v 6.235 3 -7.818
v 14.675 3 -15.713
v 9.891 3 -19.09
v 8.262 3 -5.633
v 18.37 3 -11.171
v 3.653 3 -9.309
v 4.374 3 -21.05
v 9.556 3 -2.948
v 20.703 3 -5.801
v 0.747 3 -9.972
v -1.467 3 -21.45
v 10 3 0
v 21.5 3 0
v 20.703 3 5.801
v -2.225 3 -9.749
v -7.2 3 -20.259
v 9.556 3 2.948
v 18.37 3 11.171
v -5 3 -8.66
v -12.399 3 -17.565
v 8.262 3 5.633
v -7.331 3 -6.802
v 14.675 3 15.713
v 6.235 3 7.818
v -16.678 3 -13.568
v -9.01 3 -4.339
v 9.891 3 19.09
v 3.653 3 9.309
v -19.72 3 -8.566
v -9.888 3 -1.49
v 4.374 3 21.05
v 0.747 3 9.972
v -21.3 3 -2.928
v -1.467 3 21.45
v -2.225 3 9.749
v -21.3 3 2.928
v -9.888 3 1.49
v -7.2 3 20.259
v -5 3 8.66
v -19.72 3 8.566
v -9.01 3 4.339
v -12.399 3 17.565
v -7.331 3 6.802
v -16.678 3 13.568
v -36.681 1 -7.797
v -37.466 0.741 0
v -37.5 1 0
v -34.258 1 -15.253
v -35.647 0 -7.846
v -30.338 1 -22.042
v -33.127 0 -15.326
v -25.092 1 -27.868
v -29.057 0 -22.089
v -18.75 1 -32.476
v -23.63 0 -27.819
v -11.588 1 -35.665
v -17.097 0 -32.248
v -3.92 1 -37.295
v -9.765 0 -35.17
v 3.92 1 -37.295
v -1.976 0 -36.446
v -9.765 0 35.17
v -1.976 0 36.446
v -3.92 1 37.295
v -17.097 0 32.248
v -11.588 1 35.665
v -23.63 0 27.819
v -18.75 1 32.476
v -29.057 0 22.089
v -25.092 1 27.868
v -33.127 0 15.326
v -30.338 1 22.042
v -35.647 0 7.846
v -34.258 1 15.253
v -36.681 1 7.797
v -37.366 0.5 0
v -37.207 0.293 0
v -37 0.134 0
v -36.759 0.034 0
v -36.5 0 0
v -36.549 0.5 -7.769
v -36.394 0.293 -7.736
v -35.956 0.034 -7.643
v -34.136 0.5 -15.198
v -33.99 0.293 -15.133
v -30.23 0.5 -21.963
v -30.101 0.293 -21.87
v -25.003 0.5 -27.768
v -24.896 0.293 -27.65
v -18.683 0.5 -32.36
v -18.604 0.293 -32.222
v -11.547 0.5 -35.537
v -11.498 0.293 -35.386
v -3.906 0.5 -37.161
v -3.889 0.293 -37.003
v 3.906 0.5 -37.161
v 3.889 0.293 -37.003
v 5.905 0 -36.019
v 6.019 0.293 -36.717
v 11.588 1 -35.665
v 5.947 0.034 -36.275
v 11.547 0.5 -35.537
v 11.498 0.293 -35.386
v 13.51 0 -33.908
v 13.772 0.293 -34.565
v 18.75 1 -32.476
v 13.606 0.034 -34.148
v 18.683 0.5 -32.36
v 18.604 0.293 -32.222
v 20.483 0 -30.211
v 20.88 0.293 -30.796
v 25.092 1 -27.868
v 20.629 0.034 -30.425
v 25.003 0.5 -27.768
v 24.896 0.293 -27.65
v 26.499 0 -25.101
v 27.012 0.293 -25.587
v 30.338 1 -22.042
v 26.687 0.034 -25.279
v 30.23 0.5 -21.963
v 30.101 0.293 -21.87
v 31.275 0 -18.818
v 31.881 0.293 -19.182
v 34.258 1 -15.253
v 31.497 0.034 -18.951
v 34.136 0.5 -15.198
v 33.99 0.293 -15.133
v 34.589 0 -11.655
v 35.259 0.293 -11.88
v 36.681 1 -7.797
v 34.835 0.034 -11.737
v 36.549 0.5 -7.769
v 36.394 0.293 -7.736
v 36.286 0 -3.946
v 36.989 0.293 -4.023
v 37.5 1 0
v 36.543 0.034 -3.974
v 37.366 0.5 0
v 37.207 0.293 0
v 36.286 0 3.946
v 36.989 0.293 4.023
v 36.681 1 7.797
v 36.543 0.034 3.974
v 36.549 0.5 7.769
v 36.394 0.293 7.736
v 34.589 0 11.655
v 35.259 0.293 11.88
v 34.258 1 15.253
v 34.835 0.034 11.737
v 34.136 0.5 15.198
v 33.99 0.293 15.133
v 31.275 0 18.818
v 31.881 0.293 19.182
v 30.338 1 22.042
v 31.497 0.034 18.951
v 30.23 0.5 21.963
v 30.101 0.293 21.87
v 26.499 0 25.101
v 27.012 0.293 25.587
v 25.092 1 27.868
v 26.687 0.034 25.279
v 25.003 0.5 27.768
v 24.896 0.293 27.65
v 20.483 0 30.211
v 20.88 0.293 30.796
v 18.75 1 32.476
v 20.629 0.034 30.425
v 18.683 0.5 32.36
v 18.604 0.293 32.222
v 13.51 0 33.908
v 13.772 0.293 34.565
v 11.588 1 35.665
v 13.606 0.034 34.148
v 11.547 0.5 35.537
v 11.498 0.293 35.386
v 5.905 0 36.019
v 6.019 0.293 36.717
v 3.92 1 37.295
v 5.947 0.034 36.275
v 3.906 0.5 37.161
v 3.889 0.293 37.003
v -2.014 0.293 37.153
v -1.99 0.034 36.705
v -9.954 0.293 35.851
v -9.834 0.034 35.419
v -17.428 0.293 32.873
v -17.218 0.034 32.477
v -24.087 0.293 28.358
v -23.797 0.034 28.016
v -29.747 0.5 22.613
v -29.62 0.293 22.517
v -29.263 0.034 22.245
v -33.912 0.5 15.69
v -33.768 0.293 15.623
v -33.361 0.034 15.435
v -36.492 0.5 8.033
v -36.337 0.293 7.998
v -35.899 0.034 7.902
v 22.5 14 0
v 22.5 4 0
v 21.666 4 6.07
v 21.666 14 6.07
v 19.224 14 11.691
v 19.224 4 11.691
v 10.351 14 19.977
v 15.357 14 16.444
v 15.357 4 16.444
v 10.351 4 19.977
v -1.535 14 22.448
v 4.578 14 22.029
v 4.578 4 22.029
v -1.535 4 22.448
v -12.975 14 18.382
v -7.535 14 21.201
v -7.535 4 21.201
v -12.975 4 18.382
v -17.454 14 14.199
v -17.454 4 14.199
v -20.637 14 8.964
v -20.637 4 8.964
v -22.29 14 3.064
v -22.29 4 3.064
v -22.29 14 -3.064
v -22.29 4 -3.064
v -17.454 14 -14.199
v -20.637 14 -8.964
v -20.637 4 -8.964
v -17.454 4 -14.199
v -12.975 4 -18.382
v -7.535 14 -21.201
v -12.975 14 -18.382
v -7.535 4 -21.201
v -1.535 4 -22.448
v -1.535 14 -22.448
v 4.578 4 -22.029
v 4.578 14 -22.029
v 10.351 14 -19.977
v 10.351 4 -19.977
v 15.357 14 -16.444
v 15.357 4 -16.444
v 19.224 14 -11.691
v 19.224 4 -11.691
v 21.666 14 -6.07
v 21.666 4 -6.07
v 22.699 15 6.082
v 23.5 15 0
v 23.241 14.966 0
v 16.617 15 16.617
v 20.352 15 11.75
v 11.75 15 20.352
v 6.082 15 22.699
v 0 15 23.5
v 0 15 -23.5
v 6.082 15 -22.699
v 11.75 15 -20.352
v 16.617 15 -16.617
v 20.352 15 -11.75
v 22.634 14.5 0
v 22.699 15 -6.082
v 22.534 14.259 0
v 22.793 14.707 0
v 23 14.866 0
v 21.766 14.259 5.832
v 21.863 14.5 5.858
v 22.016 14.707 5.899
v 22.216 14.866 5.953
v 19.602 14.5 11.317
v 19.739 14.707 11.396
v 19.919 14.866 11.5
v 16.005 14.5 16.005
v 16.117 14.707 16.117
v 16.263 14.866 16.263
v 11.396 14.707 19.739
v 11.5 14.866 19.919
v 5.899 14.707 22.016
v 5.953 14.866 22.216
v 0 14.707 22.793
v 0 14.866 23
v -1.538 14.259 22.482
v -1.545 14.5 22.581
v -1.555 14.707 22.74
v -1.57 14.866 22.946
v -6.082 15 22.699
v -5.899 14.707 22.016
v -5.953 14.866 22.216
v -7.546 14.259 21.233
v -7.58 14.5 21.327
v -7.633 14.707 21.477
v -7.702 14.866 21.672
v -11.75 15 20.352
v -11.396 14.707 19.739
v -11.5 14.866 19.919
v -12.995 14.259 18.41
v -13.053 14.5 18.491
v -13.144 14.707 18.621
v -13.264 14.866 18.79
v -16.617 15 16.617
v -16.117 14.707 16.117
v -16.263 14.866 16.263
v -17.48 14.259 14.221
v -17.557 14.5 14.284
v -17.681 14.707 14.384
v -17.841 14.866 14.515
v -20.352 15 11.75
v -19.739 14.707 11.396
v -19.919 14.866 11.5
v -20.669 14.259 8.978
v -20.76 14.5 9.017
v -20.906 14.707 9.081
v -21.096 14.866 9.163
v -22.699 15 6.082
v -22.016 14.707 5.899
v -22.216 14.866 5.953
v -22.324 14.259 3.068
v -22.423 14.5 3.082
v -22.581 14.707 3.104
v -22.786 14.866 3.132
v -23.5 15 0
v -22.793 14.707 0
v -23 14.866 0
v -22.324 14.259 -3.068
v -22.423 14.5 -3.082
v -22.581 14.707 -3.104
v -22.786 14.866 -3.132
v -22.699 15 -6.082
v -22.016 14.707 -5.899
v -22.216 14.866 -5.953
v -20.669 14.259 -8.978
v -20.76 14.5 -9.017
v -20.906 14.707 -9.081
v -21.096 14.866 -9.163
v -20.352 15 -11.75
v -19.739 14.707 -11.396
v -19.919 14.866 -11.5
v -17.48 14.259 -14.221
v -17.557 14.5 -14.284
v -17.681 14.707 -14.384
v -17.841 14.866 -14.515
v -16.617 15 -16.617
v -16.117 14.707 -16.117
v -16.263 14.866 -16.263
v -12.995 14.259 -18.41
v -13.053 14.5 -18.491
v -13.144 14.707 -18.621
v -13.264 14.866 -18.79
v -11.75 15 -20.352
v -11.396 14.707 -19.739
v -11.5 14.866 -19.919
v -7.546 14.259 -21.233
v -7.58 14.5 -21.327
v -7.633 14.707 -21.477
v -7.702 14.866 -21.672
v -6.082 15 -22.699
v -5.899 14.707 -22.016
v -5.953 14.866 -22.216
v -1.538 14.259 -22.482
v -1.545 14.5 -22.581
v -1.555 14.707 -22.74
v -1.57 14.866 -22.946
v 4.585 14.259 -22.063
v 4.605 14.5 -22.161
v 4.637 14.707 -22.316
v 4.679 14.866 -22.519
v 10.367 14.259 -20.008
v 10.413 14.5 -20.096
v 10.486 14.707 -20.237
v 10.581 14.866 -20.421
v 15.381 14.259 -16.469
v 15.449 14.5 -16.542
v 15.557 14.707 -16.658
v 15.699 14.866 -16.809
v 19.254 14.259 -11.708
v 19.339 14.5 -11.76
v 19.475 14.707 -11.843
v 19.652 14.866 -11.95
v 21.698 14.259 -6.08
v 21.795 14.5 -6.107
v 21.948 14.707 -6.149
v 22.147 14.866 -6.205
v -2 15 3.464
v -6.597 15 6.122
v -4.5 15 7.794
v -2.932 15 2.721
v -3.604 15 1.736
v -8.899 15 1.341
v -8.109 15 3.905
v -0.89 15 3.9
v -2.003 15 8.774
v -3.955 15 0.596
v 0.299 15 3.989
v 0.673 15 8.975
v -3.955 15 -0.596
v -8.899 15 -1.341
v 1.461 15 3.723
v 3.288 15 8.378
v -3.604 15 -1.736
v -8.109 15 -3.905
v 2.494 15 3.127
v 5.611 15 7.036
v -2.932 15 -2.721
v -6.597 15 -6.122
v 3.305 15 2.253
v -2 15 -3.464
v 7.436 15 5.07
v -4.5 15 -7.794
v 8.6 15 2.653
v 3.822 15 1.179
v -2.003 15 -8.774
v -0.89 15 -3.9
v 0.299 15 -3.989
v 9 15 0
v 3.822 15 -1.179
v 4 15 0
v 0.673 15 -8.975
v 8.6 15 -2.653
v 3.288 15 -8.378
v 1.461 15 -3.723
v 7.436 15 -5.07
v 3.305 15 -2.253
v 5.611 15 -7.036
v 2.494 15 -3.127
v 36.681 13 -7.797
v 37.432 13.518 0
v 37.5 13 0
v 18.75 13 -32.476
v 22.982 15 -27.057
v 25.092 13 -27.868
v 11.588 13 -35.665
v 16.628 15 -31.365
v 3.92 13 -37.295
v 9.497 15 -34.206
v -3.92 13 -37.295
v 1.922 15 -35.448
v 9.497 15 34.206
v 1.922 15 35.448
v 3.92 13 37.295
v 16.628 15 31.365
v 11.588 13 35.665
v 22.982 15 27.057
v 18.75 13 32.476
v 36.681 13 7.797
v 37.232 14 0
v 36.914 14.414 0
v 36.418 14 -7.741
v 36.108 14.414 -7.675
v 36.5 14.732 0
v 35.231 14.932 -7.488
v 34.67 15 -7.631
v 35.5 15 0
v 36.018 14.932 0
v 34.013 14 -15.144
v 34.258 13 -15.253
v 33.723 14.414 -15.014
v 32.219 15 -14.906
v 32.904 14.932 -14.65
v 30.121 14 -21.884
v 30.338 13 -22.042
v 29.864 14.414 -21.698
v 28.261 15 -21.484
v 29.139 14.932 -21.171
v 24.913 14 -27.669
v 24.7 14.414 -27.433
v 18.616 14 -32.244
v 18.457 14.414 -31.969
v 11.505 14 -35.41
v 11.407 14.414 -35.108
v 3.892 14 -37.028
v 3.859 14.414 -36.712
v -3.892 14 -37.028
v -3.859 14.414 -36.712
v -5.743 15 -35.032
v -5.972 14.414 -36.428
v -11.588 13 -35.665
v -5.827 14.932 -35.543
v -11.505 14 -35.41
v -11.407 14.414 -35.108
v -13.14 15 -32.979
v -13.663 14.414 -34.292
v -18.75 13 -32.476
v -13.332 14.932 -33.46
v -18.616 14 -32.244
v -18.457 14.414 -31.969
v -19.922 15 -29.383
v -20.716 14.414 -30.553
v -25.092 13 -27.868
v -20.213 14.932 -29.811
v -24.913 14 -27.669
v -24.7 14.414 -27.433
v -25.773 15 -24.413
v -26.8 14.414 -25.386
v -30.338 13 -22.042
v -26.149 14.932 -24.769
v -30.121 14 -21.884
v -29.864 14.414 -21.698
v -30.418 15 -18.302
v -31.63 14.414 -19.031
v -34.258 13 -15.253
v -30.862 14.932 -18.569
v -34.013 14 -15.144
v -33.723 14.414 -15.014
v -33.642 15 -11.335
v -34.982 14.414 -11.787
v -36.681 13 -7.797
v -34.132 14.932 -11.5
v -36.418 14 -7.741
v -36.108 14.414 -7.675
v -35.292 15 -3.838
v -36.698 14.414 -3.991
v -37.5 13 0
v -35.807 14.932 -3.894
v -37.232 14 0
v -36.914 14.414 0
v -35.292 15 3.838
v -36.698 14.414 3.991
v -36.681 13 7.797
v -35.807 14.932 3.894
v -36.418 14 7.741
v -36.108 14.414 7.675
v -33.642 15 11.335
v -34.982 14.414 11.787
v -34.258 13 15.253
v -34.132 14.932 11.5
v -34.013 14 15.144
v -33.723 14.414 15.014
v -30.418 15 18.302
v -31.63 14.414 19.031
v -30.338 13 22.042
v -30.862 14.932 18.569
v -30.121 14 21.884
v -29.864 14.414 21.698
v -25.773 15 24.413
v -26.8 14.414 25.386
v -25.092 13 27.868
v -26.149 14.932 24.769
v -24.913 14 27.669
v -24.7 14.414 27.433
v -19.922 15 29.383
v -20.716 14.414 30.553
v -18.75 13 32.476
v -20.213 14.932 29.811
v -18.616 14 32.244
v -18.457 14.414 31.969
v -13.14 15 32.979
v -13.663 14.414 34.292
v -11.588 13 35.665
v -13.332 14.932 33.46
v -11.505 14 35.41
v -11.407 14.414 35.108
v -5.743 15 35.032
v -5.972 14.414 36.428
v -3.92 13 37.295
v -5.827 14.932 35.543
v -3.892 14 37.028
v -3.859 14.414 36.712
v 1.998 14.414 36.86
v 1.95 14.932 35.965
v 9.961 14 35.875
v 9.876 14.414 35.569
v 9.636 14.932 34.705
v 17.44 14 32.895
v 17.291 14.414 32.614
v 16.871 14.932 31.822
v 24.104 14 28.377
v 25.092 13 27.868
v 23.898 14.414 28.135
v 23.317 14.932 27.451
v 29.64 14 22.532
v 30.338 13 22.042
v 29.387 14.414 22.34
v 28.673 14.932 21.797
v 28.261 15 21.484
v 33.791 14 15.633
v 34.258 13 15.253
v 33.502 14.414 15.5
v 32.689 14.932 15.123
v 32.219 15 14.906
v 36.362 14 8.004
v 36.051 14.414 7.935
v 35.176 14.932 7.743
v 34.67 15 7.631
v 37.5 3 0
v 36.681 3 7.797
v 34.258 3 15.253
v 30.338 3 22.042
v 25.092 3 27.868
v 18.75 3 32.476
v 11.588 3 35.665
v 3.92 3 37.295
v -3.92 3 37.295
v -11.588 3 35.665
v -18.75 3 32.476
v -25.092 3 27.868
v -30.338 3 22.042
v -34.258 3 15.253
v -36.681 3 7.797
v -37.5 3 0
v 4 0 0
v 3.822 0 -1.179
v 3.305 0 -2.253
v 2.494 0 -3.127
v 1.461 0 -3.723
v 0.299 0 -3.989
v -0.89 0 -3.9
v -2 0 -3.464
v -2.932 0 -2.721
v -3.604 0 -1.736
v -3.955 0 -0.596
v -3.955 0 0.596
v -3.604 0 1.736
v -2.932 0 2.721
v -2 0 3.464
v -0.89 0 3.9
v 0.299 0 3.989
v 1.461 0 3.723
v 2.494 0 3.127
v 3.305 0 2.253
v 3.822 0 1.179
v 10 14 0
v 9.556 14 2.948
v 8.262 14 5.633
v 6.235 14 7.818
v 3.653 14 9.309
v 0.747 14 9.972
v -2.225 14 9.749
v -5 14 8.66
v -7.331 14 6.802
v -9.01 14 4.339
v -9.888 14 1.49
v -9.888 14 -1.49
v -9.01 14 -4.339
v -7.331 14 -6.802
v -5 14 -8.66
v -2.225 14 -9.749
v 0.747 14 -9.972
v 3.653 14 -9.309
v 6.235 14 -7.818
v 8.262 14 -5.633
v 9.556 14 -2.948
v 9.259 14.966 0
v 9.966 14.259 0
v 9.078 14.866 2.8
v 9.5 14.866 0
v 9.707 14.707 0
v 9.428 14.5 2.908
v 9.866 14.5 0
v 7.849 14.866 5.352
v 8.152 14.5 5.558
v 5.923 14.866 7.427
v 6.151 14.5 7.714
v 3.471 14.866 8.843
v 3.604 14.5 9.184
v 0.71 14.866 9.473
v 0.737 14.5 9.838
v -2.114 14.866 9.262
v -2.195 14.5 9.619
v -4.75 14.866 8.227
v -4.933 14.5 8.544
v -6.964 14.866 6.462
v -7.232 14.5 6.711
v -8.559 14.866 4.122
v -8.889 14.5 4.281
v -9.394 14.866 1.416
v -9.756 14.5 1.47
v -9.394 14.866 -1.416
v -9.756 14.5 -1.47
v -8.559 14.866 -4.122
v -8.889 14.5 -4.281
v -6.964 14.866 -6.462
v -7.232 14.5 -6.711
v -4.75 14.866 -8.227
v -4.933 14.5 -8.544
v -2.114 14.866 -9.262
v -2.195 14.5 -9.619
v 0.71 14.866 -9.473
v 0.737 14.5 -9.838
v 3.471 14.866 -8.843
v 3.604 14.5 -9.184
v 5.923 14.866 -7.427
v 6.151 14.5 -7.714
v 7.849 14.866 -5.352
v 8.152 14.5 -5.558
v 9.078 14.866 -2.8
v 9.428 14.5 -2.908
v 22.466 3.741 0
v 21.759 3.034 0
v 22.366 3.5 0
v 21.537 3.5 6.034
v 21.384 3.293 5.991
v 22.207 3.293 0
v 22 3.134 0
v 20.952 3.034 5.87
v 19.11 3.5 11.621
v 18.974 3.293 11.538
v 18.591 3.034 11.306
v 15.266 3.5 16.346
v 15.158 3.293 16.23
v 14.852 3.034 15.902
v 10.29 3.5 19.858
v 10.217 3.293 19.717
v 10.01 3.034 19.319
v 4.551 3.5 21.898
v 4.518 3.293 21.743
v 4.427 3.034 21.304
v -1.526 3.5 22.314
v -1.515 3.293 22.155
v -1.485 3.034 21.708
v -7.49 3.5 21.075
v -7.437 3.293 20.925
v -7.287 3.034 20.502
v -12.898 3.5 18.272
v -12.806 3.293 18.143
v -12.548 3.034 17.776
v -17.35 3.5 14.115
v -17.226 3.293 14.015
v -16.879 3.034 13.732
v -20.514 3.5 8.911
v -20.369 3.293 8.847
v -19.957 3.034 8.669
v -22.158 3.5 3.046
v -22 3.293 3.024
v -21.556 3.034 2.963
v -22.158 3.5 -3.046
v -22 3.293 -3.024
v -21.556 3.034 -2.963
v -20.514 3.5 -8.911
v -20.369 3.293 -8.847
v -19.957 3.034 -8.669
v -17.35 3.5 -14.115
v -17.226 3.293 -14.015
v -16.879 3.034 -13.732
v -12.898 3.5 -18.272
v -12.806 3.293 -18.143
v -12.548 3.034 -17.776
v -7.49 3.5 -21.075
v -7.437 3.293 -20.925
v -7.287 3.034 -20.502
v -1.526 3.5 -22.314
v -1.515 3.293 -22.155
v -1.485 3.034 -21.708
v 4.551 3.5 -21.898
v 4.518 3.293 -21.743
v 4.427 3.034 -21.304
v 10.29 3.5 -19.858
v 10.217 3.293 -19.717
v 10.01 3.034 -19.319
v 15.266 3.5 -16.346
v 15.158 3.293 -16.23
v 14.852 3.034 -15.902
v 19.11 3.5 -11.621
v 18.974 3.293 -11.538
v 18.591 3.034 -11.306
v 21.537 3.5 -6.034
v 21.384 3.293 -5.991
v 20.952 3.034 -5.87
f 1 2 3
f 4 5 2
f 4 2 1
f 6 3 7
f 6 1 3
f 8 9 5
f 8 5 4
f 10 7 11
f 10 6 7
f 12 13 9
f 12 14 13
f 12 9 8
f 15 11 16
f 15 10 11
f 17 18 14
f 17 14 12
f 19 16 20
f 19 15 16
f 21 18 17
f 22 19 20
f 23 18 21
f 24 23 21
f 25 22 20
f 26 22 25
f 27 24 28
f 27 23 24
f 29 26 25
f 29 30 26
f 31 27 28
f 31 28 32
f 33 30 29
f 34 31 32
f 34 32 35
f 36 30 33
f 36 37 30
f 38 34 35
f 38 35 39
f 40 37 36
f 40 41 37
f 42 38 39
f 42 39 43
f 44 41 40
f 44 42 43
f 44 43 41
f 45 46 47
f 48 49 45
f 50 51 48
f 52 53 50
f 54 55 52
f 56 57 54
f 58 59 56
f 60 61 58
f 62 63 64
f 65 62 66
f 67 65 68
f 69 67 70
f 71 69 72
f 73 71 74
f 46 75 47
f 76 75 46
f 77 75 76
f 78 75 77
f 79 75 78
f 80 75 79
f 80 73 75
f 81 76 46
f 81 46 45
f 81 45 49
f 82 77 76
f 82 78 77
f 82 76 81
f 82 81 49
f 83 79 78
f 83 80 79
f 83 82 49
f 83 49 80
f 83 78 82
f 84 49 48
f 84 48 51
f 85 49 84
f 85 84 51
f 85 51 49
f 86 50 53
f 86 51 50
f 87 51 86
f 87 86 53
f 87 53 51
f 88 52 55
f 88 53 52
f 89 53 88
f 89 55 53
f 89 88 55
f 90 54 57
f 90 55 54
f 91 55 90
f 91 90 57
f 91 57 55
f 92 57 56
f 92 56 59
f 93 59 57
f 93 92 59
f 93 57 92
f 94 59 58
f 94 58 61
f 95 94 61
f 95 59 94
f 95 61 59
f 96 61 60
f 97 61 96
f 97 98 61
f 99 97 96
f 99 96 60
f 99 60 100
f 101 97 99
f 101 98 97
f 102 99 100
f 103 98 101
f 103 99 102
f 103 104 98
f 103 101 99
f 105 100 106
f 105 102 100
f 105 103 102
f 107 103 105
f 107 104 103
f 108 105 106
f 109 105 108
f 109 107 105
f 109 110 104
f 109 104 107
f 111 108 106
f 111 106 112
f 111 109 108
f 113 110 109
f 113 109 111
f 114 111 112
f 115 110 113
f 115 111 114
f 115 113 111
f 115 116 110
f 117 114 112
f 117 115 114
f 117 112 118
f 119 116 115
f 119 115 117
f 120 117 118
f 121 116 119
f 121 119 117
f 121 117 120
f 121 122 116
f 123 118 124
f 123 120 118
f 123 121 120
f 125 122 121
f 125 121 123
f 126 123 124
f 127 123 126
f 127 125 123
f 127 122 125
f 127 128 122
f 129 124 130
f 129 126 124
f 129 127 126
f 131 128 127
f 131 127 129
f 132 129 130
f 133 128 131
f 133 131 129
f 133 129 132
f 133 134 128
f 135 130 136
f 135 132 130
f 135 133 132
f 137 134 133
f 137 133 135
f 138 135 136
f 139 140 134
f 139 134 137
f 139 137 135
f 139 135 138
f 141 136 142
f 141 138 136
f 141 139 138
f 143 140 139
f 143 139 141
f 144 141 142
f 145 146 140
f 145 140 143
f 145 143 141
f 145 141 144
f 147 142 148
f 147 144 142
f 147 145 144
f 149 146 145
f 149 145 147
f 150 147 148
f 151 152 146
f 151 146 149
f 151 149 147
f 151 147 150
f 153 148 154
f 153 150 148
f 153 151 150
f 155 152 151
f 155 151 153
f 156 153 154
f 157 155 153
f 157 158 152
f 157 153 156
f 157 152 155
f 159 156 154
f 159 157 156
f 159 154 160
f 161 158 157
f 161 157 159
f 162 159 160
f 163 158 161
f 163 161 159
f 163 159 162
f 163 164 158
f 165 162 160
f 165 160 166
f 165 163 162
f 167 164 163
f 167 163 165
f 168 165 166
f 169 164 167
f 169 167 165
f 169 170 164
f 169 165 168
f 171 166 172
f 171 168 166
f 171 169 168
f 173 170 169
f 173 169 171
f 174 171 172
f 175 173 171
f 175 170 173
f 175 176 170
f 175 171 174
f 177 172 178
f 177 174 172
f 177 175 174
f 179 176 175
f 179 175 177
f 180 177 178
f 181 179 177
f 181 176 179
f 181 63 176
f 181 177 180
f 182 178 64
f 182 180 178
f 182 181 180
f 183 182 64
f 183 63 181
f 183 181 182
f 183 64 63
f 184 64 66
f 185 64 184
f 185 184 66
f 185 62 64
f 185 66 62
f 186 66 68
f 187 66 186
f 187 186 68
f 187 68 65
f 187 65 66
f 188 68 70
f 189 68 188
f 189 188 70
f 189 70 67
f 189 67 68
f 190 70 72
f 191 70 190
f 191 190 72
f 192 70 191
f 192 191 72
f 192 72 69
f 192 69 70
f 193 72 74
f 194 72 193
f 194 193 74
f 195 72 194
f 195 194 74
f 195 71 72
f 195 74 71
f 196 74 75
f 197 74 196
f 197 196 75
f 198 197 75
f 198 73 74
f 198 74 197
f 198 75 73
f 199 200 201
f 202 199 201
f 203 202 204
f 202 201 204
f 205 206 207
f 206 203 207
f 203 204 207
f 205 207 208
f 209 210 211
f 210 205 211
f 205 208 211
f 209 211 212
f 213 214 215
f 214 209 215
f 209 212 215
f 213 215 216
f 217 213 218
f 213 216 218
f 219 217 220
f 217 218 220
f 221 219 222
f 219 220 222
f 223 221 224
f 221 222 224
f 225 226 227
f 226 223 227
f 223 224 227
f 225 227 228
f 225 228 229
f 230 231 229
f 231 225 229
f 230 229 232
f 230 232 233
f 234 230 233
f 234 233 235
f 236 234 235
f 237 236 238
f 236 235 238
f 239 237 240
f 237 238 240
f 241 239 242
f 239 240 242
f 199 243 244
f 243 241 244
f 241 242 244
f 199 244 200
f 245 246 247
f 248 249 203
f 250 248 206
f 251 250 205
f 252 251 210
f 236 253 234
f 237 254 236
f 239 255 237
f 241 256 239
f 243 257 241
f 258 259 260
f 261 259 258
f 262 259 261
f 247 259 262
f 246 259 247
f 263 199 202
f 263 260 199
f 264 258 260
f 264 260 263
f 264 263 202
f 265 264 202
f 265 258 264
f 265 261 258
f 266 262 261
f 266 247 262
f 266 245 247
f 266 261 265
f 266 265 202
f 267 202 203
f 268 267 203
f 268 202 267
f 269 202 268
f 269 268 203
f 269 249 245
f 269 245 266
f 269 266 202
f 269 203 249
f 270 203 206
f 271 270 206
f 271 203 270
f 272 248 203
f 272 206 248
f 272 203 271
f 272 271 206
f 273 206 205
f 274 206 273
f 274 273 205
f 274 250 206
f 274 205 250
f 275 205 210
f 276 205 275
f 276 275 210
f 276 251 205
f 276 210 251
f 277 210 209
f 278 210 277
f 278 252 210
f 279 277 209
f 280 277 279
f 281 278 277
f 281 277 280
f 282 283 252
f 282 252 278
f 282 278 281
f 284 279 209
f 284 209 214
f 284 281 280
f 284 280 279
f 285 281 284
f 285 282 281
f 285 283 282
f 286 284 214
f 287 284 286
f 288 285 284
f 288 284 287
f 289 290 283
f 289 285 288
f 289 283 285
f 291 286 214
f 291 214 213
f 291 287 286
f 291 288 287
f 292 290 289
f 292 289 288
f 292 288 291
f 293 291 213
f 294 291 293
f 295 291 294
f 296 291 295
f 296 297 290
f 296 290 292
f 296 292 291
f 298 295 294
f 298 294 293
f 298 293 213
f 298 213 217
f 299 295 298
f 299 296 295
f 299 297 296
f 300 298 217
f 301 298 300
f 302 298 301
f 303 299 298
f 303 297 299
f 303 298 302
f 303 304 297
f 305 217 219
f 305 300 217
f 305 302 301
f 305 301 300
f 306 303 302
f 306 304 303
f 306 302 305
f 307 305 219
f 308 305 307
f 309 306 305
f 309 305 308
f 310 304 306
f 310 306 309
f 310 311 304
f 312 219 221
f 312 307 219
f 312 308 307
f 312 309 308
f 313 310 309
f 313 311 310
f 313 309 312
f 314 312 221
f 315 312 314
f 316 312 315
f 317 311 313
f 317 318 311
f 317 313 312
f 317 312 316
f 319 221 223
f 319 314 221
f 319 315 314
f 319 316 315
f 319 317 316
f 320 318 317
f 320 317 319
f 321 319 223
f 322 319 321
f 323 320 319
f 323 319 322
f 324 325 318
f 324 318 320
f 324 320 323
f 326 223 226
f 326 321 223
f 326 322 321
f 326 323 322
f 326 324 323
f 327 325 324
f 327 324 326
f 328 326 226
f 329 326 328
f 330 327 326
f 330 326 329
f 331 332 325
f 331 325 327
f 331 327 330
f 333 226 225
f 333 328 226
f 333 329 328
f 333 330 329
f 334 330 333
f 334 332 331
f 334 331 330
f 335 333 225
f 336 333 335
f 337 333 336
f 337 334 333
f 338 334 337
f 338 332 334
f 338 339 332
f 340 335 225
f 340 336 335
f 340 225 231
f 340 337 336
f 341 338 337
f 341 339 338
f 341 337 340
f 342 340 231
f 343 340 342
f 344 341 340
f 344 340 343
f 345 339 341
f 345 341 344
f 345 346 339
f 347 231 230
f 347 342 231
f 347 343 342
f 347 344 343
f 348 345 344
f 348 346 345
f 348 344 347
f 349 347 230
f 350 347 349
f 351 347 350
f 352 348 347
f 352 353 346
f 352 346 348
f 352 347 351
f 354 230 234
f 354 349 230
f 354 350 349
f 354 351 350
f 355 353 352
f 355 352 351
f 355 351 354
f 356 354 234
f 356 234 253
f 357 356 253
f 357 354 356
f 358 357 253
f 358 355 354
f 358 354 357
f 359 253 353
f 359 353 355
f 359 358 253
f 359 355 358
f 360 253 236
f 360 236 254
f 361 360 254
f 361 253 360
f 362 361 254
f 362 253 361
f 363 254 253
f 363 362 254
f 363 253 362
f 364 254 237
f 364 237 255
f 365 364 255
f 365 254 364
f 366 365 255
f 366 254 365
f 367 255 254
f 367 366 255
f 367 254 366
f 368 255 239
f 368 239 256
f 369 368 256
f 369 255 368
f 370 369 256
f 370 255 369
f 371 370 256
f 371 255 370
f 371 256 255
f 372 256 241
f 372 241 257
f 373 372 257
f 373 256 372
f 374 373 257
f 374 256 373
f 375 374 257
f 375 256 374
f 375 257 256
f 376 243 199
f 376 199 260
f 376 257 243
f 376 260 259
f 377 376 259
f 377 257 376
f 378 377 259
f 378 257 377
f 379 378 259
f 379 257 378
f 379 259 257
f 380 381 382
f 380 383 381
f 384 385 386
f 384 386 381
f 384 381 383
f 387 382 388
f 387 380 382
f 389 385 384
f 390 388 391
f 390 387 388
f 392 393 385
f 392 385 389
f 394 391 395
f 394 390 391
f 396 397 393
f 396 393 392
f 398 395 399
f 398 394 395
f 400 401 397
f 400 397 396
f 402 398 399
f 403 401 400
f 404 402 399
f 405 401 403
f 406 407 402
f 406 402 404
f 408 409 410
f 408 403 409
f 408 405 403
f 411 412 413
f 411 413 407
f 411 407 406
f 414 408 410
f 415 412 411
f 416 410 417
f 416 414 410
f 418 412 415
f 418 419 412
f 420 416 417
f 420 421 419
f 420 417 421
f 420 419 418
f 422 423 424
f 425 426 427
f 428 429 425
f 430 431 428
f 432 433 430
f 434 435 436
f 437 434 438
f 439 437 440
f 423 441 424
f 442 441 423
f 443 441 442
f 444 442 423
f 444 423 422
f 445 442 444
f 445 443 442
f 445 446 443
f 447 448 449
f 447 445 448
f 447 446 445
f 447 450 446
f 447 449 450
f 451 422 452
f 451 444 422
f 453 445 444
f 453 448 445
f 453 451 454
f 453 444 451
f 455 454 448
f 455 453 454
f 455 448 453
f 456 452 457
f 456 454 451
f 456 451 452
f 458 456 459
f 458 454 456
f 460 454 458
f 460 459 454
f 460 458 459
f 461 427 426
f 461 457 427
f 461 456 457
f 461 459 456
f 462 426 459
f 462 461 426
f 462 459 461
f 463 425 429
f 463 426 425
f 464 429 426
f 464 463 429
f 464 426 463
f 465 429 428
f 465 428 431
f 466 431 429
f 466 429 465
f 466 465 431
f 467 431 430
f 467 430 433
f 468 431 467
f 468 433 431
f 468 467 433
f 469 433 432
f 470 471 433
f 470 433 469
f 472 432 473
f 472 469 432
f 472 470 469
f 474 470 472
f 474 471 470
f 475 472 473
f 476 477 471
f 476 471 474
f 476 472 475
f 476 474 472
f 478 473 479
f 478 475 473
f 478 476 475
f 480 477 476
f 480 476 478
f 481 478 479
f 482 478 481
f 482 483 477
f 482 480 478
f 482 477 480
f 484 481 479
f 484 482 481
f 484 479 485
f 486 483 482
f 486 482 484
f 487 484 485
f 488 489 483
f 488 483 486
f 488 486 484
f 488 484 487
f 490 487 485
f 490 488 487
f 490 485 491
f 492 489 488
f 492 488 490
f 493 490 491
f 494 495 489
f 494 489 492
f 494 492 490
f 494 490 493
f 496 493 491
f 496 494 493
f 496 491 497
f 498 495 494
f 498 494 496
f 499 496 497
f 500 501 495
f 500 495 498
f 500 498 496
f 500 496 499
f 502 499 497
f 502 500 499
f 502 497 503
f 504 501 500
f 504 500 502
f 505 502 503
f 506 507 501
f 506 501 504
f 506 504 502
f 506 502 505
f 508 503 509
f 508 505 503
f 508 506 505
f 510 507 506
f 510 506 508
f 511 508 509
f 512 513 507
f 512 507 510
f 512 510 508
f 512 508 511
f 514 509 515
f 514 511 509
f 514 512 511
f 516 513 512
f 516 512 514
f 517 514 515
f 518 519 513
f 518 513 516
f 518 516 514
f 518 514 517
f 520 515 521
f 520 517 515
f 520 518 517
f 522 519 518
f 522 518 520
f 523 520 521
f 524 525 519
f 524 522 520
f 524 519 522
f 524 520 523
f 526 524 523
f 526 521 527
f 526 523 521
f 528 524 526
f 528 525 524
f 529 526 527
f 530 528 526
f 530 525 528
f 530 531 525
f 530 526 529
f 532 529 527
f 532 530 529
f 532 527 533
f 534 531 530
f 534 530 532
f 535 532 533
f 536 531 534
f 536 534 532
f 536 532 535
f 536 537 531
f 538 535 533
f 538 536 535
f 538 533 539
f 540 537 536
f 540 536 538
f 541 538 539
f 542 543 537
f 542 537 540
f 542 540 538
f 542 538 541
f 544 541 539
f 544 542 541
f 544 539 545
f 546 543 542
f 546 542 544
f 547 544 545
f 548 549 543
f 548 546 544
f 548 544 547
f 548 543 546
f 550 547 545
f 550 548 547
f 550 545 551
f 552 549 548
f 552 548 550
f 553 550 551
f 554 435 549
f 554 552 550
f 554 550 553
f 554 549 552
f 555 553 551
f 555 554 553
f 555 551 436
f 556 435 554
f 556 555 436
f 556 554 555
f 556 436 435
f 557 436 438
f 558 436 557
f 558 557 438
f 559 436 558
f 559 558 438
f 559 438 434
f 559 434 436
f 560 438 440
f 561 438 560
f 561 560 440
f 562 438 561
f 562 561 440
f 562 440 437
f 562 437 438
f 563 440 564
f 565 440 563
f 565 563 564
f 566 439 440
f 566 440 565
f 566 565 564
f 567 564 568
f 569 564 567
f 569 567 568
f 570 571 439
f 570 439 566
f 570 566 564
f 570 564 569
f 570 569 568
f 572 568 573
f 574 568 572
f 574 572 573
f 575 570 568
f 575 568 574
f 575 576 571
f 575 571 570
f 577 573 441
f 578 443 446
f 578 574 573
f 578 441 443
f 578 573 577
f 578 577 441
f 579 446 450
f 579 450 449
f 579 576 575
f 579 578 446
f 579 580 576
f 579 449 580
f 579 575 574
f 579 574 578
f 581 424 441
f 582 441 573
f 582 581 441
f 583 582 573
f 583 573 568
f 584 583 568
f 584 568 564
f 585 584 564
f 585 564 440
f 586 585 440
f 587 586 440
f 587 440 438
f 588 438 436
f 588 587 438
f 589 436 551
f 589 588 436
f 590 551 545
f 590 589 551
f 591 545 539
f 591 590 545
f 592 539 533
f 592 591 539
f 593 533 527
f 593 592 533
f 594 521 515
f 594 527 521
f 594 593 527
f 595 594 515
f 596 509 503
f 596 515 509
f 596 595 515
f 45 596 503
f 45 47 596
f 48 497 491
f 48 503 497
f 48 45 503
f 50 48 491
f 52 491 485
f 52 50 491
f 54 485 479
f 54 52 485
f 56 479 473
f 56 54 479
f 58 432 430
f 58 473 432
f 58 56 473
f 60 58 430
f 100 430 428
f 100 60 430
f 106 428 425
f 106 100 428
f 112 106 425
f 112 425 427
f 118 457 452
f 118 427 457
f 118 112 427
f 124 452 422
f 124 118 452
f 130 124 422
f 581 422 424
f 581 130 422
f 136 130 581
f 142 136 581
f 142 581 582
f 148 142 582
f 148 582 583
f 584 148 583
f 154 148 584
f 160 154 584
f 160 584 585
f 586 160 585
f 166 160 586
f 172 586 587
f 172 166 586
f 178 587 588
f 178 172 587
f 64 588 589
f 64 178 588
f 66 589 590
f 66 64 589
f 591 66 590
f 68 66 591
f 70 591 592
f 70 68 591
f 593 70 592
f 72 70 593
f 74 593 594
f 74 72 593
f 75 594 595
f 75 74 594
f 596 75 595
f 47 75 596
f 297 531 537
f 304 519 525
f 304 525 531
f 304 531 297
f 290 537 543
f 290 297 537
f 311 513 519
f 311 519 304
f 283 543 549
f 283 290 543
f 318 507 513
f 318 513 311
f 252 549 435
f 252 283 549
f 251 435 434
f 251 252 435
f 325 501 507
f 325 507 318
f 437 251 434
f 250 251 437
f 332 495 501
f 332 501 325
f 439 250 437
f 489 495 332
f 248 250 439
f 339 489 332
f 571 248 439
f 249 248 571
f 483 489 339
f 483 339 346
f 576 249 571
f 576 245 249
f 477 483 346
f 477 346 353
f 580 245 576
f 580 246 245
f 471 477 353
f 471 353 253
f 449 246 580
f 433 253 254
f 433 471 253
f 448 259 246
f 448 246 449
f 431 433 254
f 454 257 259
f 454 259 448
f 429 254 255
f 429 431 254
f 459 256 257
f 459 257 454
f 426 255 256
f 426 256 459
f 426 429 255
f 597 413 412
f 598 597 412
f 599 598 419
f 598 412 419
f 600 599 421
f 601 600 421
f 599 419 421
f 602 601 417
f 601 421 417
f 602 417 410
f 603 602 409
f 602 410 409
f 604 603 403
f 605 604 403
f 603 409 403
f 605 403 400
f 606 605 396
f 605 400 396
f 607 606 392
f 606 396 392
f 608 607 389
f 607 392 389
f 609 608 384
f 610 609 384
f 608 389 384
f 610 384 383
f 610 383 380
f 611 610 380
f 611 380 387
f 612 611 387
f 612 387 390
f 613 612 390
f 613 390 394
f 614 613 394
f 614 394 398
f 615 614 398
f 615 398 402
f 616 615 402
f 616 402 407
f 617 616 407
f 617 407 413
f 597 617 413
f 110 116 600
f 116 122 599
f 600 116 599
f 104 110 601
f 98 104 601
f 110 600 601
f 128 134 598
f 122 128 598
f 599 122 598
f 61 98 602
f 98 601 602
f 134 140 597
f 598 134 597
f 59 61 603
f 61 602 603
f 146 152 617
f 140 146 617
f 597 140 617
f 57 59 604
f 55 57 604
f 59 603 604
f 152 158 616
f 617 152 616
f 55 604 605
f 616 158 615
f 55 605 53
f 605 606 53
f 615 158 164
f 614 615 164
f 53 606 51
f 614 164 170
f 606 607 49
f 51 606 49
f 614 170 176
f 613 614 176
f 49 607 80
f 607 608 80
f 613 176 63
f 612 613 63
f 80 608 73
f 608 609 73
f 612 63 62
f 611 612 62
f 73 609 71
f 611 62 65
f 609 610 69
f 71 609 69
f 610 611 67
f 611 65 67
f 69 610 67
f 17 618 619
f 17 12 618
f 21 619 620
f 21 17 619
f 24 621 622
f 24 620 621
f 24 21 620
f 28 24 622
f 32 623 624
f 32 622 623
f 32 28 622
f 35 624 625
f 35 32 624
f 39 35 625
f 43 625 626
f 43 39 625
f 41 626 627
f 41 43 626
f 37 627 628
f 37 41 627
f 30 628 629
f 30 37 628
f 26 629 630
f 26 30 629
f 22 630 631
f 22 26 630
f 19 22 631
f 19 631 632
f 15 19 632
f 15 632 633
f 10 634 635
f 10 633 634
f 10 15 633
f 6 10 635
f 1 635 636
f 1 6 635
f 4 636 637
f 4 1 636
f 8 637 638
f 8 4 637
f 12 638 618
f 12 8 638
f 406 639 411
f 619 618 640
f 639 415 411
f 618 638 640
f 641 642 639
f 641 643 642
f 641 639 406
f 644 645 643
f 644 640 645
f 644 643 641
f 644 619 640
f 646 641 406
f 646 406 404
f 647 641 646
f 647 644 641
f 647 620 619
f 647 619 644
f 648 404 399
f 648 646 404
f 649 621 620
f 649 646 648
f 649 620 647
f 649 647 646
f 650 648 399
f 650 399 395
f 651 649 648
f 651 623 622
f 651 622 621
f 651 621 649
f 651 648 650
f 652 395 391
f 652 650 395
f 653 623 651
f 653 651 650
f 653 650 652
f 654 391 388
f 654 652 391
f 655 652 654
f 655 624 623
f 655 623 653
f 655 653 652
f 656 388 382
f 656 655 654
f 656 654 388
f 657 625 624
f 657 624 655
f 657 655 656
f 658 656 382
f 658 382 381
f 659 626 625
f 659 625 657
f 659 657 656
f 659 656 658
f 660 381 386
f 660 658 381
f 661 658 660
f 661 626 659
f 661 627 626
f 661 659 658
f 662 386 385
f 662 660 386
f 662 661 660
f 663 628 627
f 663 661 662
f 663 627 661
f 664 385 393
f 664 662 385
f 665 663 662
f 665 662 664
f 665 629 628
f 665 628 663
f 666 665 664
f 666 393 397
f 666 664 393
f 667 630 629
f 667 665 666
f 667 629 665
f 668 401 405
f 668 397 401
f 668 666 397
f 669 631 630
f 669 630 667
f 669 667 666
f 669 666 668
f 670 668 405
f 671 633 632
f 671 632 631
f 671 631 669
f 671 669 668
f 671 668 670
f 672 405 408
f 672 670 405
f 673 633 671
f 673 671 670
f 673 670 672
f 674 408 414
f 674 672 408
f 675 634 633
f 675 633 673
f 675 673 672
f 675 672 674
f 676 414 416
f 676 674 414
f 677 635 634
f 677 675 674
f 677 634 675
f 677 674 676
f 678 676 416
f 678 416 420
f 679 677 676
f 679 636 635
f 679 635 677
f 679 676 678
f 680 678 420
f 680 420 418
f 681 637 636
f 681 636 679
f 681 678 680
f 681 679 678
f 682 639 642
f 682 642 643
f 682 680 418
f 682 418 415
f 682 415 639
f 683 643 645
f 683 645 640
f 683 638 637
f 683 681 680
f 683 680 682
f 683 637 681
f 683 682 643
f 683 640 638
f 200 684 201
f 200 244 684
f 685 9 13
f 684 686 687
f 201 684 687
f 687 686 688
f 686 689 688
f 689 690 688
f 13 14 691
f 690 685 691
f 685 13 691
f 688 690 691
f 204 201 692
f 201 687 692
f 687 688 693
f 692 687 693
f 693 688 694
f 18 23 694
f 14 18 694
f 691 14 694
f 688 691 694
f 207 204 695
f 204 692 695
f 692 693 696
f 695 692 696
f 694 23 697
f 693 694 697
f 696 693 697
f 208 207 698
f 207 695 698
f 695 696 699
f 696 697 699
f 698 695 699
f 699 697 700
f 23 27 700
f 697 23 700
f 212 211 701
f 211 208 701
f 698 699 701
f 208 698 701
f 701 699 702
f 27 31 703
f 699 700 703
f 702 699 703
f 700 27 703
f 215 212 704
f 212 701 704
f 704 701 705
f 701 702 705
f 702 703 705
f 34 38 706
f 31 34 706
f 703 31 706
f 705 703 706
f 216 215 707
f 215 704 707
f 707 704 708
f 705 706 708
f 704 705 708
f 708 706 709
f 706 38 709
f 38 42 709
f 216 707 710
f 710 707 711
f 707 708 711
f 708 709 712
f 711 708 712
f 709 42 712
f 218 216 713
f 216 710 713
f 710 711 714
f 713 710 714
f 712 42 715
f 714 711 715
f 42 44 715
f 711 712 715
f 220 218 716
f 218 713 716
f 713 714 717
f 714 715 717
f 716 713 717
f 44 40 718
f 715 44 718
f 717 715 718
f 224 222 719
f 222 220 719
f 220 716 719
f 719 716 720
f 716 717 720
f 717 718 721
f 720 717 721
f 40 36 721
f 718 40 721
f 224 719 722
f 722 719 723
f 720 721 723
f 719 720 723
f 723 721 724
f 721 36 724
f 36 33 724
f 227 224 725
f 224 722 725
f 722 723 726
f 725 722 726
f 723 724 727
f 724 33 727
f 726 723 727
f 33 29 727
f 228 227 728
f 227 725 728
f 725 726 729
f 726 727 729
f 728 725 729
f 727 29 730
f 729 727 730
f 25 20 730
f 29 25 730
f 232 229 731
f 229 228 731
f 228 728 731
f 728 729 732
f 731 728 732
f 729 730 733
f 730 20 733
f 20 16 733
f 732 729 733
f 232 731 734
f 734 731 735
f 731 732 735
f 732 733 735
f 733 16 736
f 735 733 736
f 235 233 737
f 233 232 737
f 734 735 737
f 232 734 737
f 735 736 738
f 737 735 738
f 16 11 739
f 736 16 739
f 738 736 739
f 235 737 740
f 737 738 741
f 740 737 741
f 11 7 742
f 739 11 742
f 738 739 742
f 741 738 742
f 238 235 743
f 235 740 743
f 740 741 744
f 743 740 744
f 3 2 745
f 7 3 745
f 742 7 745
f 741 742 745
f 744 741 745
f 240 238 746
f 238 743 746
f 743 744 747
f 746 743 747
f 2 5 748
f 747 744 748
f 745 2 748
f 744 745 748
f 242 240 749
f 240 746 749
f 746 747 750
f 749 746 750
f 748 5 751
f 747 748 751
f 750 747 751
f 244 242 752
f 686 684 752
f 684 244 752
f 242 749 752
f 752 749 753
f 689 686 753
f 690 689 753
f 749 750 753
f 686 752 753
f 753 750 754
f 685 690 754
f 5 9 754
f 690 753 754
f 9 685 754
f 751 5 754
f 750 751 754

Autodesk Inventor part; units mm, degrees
ref_plane "YZ Plane" through (0, 0, 0) normal (1, 0, 0) x (0, 1, 0)
ref_plane "XZ Plane" through (0, 0, 0) normal (0, 1, 0) x (-1, 0, 0)
ref_plane "XY Plane" through (0, 0, 0) normal (0, 0, 1) x (1, 0, 0)
sketch "Esquisse1" plane through (0, 0, 0) normal (0, 1, 0) x (-1, 0, 0)
  circle A0 centre (0, 0) radius 37.5
  dimension "d0" = 75
extrude "Extrusion1" add sketch "Esquisse1" along normal blind 3
sketch "Esquisse2" plane through (0, 3, 0) normal (0, 1, 0) x (1, 0, 0)
  circle A0 centre (0, 0) radius 37.5 projected
  circle A1 centre (0, 0) radius 10
  circle A2 centre (0, 0) radius 22.5
  dimension "d3" = 15
  dimension "d4" = 20
extrude "Extrusion2" add sketch "Esquisse2" along normal blind 12
sketch "Esquisse3" plane through (0, 15, 0) normal (0, 1, 0) x (1, 0, 0)
  circle A0 centre (0, 0) radius 10 projected
  circle A1 centre (0, 0) radius 4
  dimension "d7" = 8
extrude "Extrusion3" cut sketch "Esquisse3" against normal through all contours A1
fillet "Congé1" radius 2 1 edges at (-37.5, 15, 0)
fillet "Congé2" radius 1 1 edges at (-10, 15, 0)
fillet "Congé3" radius 1 1 edges at (-22.5, 15, 0)
fillet "Congé4" radius 1 1 edges at (-22.5, 3, 0)
fillet "Congé5" radius 1 1 edges at (37.5, 0, 0)
properties part number "wheel"
